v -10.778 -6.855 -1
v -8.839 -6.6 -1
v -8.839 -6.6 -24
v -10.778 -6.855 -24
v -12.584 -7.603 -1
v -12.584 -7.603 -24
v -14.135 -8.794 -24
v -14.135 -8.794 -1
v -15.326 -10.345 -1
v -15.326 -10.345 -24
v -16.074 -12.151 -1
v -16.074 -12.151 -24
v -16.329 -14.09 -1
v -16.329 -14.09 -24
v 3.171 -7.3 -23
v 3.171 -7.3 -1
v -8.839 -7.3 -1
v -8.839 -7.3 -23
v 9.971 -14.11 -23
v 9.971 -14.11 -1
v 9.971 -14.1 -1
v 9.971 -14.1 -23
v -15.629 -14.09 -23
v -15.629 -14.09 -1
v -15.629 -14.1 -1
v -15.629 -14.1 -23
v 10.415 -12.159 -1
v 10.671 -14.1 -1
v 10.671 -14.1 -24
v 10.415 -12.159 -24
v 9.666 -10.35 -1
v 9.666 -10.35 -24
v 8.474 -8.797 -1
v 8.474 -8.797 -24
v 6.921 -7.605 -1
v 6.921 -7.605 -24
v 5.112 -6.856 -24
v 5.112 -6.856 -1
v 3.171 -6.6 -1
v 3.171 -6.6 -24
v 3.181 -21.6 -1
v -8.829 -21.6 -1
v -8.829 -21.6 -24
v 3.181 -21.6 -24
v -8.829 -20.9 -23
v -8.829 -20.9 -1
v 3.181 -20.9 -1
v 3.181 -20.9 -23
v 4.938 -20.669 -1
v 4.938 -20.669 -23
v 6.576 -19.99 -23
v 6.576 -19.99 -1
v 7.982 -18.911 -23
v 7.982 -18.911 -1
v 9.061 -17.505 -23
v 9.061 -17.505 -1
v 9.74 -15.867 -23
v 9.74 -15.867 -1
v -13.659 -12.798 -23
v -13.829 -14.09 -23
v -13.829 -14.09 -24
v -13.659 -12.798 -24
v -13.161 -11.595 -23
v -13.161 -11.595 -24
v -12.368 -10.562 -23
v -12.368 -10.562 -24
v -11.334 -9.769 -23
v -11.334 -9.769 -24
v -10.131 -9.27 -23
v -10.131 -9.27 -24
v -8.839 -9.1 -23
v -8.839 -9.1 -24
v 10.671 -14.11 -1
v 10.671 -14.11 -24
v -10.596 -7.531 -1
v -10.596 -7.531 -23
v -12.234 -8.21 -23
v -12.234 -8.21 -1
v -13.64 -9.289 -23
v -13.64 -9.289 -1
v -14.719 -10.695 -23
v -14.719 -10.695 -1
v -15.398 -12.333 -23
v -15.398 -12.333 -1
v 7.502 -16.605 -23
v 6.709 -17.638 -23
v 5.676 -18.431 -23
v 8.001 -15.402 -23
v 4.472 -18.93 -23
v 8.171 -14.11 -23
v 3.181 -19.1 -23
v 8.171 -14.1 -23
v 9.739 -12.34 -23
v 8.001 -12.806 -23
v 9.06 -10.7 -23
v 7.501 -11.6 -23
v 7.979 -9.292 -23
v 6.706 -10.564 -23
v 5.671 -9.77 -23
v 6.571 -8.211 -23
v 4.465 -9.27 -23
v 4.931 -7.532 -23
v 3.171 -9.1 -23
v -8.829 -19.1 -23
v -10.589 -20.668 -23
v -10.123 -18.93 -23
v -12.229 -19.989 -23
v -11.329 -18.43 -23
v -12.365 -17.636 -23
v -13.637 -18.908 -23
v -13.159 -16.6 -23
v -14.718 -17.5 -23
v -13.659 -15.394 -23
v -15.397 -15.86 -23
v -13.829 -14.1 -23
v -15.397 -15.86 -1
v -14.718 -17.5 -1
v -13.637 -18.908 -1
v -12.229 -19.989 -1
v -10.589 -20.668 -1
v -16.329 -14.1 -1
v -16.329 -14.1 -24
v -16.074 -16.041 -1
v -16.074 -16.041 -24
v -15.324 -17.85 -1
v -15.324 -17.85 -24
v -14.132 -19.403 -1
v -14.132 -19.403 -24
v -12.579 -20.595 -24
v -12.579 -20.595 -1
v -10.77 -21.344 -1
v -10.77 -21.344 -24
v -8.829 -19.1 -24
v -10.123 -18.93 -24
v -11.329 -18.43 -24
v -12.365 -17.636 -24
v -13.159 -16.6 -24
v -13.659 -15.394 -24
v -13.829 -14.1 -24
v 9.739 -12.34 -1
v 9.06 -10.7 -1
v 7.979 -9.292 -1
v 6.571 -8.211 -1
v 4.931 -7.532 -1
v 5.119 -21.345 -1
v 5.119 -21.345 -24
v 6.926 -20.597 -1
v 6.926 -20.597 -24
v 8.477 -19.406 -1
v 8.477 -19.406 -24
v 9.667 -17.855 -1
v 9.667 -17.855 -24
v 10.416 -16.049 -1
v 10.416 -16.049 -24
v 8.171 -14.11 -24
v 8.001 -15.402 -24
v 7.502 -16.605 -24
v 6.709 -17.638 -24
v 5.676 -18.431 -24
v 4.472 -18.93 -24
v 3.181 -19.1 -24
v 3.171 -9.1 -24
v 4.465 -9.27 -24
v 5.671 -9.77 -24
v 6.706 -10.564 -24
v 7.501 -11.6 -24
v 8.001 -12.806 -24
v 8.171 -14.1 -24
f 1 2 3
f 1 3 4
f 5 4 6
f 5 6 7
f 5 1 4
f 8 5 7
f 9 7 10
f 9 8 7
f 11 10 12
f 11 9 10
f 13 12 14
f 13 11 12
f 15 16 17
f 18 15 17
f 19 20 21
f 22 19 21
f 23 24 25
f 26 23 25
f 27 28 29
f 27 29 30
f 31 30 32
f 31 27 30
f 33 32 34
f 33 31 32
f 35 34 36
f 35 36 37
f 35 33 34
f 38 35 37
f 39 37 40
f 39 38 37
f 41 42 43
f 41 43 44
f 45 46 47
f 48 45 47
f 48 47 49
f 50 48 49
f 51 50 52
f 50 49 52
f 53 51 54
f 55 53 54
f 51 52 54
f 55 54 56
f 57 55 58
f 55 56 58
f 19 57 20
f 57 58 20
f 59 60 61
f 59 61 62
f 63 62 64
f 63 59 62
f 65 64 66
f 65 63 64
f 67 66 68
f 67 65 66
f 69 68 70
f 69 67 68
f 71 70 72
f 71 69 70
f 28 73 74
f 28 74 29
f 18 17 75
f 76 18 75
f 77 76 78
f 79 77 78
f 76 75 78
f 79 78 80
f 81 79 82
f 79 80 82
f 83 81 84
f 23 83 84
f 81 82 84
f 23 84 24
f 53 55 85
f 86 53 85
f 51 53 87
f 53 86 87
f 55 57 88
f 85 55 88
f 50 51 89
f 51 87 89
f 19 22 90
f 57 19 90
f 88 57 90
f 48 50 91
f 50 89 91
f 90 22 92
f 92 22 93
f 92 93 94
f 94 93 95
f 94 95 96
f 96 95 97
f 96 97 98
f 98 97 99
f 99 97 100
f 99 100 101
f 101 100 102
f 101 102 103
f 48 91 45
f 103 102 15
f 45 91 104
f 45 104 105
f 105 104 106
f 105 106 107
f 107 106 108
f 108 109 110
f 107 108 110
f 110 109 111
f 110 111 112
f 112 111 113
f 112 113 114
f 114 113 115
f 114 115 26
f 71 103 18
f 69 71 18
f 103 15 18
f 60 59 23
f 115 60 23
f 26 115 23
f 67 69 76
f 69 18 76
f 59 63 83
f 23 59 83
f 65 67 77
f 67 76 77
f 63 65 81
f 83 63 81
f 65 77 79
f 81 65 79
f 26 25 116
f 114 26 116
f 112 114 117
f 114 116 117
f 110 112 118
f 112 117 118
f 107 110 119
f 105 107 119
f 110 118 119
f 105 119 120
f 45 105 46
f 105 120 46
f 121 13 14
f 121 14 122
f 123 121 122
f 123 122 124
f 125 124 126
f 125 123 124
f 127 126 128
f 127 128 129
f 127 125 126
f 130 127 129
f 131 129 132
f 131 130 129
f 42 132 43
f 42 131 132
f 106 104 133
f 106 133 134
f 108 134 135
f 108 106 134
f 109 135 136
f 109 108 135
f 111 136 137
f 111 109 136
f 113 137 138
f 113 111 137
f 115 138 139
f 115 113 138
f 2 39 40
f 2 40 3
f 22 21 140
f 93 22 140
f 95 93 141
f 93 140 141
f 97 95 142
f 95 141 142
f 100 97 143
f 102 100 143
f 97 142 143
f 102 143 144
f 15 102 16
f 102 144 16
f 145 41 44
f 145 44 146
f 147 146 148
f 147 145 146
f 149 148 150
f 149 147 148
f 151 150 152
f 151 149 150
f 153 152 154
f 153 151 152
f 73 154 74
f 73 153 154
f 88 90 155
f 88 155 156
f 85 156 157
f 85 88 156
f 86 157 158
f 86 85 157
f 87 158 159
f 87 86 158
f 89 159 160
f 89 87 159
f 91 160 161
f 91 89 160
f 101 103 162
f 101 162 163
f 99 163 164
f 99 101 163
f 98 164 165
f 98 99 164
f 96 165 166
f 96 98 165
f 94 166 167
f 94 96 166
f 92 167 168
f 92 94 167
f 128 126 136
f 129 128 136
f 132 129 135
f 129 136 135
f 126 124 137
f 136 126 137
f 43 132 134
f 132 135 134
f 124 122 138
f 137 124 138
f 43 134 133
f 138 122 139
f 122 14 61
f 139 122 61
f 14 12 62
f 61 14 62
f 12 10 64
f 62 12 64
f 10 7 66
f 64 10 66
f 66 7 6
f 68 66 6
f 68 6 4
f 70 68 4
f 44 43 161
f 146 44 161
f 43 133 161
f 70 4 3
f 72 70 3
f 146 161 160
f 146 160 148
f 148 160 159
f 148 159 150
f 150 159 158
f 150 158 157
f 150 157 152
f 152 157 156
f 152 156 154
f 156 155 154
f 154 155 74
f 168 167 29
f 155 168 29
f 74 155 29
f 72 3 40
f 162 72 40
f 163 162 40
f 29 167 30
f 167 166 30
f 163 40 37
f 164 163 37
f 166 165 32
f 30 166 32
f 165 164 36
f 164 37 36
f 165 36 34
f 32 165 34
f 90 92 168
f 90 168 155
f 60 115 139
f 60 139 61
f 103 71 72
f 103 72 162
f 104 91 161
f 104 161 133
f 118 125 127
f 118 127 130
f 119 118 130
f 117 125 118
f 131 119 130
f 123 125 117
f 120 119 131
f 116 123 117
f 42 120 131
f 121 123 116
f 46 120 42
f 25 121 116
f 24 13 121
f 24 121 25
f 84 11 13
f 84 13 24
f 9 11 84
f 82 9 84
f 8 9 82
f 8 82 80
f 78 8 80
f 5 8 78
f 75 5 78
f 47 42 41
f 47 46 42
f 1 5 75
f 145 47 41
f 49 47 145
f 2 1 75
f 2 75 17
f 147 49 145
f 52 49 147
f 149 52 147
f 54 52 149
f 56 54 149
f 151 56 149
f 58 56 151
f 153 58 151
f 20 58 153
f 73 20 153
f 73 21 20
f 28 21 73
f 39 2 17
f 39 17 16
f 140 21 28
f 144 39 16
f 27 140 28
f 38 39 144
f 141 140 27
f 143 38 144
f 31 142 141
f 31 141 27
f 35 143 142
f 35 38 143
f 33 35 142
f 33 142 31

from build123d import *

# Parameters (mm, degrees)
EXTRUSION1_DEPTH        = 24
ENL_V_MAT_EXTRU_1_DEPTH = 1
EXTRUSION2_START        = -1
EXTRUSION2_DEPTH        = 1


with BuildPart() as part:
    # Esquisse1 → Extrusion1 (new body)
    with BuildSketch(Plane.XY):
        with BuildLine():
            Line((-8.829098079, -21.6), (3.180901921, -21.6))
            ThreePointArc((3.180901921, -21.6), (8.477131712, -19.406229791), (10.670901921, -14.11))
            Line((10.670901921, -14.11), (10.670901921, -14.1))
            ThreePointArc((10.670901921, -14.1), (8.47420278, -8.796699141), (3.170901921, -6.6))
            Line((3.170901921, -6.6), (-8.839098079, -6.6))
            ThreePointArc((-8.839098079, -6.6), (-14.13532787, -8.793770209), (-16.329098079, -14.09))
            Line((-16.329098079, -14.09), (-16.329098079, -14.1))
            ThreePointArc((-16.329098079, -14.1), (-14.132398938, -19.403300859), (-8.829098079, -21.6))
        make_face()
        with BuildLine():
            Line((3.170901921, -7.3), (-8.839098079, -7.3))
            ThreePointArc((-8.839098079, -7.3), (-13.640353124, -9.288744956), (-15.629098079, -14.09))
            Line((-15.629098079, -14.09), (-15.629098079, -14.1))
            ThreePointArc((-15.629098079, -14.1), (-13.637424191, -18.908326112), (-8.829098079, -20.9))
            Line((-8.829098079, -20.9), (3.180901921, -20.9))
            ThreePointArc((3.180901921, -20.9), (7.982156965, -18.911255044), (9.970901921, -14.11))
            Line((9.970901921, -14.11), (9.970901921, -14.1))
            ThreePointArc((9.970901921, -14.1), (7.979228033, -9.291673888), (3.170901921, -7.3))
        make_face(mode=Mode.SUBTRACT)
    extrude(amount=-EXTRUSION1_DEPTH)

    # Esquisse2 → Enlèv. mat.-Extru.1 (cut)
    with BuildSketch(Plane.XY):
        with BuildLine():
            Line((-8.829098079, -21.6), (3.180901921, -21.6))
            ThreePointArc((3.180901921, -21.6), (8.477131712, -19.406229791), (10.670901921, -14.11))
            Line((10.670901921, -14.11), (10.670901921, -14.1))
            ThreePointArc((10.670901921, -14.1), (8.47420278, -8.796699141), (3.170901921, -6.6))
            Line((3.170901921, -6.6), (-8.839098079, -6.6))
            ThreePointArc((-8.839098079, -6.6), (-14.13532787, -8.793770209), (-16.329098079, -14.09))
            Line((-16.329098079, -14.09), (-16.329098079, -14.1))
            ThreePointArc((-16.329098079, -14.1), (-14.132398938, -19.403300859), (-8.829098079, -21.6))
        make_face()
    extrude(amount=-ENL_V_MAT_EXTRU_1_DEPTH, mode=Mode.SUBTRACT)

    # Esquisse3 → Extrusion2 (add)
    with BuildSketch(Plane(origin=(0, 0, -24), x_dir=(-1, 0, 0), z_dir=(0, 0, -1)).offset(EXTRUSION2_START)):
        with BuildLine():
            Line((16.329098079, -14.1), (16.329098079, -14.09))
            ThreePointArc((16.329098079, -14.09), (14.13532787, -8.793770209), (8.839098079, -6.6))
            Line((8.839098079, -6.6), (-3.170901921, -6.6))
            ThreePointArc((-3.170901921, -6.6), (-8.47420278, -8.796699141), (-10.670901921, -14.1))
            Line((-10.670901921, -14.1), (-10.670901921, -14.11))
            ThreePointArc((-10.670901921, -14.11), (-8.477131712, -19.406229791), (-3.180901921, -21.6))
            Line((-3.180901921, -21.6), (8.829098079, -21.6))
            ThreePointArc((8.829098079, -21.6), (14.132398938, -19.403300859), (16.329098079, -14.1))
        make_face()
        with BuildLine():
            Line((8.839098079, -9.1), (-3.170901921, -9.1))
            ThreePointArc((-3.170901921, -9.1), (-6.706435827, -10.564466094), (-8.170901921, -14.1))
            Line((-8.170901921, -14.1), (-8.170901921, -14.11))
            ThreePointArc((-8.170901921, -14.11), (-6.709364759, -17.638462838), (-3.180901921, -19.1))
            Line((-3.180901921, -19.1), (8.829098079, -19.1))
            ThreePointArc((8.829098079, -19.1), (12.364631985, -17.635533906), (13.829098079, -14.1))
            Line((13.829098079, -14.1), (13.829098079, -14.09))
            ThreePointArc((13.829098079, -14.09), (12.367560918, -10.561537162), (8.839098079, -9.1))
        make_face(mode=Mode.SUBTRACT)
    extrude(amount=EXTRUSION2_DEPTH)


solid = part.part
